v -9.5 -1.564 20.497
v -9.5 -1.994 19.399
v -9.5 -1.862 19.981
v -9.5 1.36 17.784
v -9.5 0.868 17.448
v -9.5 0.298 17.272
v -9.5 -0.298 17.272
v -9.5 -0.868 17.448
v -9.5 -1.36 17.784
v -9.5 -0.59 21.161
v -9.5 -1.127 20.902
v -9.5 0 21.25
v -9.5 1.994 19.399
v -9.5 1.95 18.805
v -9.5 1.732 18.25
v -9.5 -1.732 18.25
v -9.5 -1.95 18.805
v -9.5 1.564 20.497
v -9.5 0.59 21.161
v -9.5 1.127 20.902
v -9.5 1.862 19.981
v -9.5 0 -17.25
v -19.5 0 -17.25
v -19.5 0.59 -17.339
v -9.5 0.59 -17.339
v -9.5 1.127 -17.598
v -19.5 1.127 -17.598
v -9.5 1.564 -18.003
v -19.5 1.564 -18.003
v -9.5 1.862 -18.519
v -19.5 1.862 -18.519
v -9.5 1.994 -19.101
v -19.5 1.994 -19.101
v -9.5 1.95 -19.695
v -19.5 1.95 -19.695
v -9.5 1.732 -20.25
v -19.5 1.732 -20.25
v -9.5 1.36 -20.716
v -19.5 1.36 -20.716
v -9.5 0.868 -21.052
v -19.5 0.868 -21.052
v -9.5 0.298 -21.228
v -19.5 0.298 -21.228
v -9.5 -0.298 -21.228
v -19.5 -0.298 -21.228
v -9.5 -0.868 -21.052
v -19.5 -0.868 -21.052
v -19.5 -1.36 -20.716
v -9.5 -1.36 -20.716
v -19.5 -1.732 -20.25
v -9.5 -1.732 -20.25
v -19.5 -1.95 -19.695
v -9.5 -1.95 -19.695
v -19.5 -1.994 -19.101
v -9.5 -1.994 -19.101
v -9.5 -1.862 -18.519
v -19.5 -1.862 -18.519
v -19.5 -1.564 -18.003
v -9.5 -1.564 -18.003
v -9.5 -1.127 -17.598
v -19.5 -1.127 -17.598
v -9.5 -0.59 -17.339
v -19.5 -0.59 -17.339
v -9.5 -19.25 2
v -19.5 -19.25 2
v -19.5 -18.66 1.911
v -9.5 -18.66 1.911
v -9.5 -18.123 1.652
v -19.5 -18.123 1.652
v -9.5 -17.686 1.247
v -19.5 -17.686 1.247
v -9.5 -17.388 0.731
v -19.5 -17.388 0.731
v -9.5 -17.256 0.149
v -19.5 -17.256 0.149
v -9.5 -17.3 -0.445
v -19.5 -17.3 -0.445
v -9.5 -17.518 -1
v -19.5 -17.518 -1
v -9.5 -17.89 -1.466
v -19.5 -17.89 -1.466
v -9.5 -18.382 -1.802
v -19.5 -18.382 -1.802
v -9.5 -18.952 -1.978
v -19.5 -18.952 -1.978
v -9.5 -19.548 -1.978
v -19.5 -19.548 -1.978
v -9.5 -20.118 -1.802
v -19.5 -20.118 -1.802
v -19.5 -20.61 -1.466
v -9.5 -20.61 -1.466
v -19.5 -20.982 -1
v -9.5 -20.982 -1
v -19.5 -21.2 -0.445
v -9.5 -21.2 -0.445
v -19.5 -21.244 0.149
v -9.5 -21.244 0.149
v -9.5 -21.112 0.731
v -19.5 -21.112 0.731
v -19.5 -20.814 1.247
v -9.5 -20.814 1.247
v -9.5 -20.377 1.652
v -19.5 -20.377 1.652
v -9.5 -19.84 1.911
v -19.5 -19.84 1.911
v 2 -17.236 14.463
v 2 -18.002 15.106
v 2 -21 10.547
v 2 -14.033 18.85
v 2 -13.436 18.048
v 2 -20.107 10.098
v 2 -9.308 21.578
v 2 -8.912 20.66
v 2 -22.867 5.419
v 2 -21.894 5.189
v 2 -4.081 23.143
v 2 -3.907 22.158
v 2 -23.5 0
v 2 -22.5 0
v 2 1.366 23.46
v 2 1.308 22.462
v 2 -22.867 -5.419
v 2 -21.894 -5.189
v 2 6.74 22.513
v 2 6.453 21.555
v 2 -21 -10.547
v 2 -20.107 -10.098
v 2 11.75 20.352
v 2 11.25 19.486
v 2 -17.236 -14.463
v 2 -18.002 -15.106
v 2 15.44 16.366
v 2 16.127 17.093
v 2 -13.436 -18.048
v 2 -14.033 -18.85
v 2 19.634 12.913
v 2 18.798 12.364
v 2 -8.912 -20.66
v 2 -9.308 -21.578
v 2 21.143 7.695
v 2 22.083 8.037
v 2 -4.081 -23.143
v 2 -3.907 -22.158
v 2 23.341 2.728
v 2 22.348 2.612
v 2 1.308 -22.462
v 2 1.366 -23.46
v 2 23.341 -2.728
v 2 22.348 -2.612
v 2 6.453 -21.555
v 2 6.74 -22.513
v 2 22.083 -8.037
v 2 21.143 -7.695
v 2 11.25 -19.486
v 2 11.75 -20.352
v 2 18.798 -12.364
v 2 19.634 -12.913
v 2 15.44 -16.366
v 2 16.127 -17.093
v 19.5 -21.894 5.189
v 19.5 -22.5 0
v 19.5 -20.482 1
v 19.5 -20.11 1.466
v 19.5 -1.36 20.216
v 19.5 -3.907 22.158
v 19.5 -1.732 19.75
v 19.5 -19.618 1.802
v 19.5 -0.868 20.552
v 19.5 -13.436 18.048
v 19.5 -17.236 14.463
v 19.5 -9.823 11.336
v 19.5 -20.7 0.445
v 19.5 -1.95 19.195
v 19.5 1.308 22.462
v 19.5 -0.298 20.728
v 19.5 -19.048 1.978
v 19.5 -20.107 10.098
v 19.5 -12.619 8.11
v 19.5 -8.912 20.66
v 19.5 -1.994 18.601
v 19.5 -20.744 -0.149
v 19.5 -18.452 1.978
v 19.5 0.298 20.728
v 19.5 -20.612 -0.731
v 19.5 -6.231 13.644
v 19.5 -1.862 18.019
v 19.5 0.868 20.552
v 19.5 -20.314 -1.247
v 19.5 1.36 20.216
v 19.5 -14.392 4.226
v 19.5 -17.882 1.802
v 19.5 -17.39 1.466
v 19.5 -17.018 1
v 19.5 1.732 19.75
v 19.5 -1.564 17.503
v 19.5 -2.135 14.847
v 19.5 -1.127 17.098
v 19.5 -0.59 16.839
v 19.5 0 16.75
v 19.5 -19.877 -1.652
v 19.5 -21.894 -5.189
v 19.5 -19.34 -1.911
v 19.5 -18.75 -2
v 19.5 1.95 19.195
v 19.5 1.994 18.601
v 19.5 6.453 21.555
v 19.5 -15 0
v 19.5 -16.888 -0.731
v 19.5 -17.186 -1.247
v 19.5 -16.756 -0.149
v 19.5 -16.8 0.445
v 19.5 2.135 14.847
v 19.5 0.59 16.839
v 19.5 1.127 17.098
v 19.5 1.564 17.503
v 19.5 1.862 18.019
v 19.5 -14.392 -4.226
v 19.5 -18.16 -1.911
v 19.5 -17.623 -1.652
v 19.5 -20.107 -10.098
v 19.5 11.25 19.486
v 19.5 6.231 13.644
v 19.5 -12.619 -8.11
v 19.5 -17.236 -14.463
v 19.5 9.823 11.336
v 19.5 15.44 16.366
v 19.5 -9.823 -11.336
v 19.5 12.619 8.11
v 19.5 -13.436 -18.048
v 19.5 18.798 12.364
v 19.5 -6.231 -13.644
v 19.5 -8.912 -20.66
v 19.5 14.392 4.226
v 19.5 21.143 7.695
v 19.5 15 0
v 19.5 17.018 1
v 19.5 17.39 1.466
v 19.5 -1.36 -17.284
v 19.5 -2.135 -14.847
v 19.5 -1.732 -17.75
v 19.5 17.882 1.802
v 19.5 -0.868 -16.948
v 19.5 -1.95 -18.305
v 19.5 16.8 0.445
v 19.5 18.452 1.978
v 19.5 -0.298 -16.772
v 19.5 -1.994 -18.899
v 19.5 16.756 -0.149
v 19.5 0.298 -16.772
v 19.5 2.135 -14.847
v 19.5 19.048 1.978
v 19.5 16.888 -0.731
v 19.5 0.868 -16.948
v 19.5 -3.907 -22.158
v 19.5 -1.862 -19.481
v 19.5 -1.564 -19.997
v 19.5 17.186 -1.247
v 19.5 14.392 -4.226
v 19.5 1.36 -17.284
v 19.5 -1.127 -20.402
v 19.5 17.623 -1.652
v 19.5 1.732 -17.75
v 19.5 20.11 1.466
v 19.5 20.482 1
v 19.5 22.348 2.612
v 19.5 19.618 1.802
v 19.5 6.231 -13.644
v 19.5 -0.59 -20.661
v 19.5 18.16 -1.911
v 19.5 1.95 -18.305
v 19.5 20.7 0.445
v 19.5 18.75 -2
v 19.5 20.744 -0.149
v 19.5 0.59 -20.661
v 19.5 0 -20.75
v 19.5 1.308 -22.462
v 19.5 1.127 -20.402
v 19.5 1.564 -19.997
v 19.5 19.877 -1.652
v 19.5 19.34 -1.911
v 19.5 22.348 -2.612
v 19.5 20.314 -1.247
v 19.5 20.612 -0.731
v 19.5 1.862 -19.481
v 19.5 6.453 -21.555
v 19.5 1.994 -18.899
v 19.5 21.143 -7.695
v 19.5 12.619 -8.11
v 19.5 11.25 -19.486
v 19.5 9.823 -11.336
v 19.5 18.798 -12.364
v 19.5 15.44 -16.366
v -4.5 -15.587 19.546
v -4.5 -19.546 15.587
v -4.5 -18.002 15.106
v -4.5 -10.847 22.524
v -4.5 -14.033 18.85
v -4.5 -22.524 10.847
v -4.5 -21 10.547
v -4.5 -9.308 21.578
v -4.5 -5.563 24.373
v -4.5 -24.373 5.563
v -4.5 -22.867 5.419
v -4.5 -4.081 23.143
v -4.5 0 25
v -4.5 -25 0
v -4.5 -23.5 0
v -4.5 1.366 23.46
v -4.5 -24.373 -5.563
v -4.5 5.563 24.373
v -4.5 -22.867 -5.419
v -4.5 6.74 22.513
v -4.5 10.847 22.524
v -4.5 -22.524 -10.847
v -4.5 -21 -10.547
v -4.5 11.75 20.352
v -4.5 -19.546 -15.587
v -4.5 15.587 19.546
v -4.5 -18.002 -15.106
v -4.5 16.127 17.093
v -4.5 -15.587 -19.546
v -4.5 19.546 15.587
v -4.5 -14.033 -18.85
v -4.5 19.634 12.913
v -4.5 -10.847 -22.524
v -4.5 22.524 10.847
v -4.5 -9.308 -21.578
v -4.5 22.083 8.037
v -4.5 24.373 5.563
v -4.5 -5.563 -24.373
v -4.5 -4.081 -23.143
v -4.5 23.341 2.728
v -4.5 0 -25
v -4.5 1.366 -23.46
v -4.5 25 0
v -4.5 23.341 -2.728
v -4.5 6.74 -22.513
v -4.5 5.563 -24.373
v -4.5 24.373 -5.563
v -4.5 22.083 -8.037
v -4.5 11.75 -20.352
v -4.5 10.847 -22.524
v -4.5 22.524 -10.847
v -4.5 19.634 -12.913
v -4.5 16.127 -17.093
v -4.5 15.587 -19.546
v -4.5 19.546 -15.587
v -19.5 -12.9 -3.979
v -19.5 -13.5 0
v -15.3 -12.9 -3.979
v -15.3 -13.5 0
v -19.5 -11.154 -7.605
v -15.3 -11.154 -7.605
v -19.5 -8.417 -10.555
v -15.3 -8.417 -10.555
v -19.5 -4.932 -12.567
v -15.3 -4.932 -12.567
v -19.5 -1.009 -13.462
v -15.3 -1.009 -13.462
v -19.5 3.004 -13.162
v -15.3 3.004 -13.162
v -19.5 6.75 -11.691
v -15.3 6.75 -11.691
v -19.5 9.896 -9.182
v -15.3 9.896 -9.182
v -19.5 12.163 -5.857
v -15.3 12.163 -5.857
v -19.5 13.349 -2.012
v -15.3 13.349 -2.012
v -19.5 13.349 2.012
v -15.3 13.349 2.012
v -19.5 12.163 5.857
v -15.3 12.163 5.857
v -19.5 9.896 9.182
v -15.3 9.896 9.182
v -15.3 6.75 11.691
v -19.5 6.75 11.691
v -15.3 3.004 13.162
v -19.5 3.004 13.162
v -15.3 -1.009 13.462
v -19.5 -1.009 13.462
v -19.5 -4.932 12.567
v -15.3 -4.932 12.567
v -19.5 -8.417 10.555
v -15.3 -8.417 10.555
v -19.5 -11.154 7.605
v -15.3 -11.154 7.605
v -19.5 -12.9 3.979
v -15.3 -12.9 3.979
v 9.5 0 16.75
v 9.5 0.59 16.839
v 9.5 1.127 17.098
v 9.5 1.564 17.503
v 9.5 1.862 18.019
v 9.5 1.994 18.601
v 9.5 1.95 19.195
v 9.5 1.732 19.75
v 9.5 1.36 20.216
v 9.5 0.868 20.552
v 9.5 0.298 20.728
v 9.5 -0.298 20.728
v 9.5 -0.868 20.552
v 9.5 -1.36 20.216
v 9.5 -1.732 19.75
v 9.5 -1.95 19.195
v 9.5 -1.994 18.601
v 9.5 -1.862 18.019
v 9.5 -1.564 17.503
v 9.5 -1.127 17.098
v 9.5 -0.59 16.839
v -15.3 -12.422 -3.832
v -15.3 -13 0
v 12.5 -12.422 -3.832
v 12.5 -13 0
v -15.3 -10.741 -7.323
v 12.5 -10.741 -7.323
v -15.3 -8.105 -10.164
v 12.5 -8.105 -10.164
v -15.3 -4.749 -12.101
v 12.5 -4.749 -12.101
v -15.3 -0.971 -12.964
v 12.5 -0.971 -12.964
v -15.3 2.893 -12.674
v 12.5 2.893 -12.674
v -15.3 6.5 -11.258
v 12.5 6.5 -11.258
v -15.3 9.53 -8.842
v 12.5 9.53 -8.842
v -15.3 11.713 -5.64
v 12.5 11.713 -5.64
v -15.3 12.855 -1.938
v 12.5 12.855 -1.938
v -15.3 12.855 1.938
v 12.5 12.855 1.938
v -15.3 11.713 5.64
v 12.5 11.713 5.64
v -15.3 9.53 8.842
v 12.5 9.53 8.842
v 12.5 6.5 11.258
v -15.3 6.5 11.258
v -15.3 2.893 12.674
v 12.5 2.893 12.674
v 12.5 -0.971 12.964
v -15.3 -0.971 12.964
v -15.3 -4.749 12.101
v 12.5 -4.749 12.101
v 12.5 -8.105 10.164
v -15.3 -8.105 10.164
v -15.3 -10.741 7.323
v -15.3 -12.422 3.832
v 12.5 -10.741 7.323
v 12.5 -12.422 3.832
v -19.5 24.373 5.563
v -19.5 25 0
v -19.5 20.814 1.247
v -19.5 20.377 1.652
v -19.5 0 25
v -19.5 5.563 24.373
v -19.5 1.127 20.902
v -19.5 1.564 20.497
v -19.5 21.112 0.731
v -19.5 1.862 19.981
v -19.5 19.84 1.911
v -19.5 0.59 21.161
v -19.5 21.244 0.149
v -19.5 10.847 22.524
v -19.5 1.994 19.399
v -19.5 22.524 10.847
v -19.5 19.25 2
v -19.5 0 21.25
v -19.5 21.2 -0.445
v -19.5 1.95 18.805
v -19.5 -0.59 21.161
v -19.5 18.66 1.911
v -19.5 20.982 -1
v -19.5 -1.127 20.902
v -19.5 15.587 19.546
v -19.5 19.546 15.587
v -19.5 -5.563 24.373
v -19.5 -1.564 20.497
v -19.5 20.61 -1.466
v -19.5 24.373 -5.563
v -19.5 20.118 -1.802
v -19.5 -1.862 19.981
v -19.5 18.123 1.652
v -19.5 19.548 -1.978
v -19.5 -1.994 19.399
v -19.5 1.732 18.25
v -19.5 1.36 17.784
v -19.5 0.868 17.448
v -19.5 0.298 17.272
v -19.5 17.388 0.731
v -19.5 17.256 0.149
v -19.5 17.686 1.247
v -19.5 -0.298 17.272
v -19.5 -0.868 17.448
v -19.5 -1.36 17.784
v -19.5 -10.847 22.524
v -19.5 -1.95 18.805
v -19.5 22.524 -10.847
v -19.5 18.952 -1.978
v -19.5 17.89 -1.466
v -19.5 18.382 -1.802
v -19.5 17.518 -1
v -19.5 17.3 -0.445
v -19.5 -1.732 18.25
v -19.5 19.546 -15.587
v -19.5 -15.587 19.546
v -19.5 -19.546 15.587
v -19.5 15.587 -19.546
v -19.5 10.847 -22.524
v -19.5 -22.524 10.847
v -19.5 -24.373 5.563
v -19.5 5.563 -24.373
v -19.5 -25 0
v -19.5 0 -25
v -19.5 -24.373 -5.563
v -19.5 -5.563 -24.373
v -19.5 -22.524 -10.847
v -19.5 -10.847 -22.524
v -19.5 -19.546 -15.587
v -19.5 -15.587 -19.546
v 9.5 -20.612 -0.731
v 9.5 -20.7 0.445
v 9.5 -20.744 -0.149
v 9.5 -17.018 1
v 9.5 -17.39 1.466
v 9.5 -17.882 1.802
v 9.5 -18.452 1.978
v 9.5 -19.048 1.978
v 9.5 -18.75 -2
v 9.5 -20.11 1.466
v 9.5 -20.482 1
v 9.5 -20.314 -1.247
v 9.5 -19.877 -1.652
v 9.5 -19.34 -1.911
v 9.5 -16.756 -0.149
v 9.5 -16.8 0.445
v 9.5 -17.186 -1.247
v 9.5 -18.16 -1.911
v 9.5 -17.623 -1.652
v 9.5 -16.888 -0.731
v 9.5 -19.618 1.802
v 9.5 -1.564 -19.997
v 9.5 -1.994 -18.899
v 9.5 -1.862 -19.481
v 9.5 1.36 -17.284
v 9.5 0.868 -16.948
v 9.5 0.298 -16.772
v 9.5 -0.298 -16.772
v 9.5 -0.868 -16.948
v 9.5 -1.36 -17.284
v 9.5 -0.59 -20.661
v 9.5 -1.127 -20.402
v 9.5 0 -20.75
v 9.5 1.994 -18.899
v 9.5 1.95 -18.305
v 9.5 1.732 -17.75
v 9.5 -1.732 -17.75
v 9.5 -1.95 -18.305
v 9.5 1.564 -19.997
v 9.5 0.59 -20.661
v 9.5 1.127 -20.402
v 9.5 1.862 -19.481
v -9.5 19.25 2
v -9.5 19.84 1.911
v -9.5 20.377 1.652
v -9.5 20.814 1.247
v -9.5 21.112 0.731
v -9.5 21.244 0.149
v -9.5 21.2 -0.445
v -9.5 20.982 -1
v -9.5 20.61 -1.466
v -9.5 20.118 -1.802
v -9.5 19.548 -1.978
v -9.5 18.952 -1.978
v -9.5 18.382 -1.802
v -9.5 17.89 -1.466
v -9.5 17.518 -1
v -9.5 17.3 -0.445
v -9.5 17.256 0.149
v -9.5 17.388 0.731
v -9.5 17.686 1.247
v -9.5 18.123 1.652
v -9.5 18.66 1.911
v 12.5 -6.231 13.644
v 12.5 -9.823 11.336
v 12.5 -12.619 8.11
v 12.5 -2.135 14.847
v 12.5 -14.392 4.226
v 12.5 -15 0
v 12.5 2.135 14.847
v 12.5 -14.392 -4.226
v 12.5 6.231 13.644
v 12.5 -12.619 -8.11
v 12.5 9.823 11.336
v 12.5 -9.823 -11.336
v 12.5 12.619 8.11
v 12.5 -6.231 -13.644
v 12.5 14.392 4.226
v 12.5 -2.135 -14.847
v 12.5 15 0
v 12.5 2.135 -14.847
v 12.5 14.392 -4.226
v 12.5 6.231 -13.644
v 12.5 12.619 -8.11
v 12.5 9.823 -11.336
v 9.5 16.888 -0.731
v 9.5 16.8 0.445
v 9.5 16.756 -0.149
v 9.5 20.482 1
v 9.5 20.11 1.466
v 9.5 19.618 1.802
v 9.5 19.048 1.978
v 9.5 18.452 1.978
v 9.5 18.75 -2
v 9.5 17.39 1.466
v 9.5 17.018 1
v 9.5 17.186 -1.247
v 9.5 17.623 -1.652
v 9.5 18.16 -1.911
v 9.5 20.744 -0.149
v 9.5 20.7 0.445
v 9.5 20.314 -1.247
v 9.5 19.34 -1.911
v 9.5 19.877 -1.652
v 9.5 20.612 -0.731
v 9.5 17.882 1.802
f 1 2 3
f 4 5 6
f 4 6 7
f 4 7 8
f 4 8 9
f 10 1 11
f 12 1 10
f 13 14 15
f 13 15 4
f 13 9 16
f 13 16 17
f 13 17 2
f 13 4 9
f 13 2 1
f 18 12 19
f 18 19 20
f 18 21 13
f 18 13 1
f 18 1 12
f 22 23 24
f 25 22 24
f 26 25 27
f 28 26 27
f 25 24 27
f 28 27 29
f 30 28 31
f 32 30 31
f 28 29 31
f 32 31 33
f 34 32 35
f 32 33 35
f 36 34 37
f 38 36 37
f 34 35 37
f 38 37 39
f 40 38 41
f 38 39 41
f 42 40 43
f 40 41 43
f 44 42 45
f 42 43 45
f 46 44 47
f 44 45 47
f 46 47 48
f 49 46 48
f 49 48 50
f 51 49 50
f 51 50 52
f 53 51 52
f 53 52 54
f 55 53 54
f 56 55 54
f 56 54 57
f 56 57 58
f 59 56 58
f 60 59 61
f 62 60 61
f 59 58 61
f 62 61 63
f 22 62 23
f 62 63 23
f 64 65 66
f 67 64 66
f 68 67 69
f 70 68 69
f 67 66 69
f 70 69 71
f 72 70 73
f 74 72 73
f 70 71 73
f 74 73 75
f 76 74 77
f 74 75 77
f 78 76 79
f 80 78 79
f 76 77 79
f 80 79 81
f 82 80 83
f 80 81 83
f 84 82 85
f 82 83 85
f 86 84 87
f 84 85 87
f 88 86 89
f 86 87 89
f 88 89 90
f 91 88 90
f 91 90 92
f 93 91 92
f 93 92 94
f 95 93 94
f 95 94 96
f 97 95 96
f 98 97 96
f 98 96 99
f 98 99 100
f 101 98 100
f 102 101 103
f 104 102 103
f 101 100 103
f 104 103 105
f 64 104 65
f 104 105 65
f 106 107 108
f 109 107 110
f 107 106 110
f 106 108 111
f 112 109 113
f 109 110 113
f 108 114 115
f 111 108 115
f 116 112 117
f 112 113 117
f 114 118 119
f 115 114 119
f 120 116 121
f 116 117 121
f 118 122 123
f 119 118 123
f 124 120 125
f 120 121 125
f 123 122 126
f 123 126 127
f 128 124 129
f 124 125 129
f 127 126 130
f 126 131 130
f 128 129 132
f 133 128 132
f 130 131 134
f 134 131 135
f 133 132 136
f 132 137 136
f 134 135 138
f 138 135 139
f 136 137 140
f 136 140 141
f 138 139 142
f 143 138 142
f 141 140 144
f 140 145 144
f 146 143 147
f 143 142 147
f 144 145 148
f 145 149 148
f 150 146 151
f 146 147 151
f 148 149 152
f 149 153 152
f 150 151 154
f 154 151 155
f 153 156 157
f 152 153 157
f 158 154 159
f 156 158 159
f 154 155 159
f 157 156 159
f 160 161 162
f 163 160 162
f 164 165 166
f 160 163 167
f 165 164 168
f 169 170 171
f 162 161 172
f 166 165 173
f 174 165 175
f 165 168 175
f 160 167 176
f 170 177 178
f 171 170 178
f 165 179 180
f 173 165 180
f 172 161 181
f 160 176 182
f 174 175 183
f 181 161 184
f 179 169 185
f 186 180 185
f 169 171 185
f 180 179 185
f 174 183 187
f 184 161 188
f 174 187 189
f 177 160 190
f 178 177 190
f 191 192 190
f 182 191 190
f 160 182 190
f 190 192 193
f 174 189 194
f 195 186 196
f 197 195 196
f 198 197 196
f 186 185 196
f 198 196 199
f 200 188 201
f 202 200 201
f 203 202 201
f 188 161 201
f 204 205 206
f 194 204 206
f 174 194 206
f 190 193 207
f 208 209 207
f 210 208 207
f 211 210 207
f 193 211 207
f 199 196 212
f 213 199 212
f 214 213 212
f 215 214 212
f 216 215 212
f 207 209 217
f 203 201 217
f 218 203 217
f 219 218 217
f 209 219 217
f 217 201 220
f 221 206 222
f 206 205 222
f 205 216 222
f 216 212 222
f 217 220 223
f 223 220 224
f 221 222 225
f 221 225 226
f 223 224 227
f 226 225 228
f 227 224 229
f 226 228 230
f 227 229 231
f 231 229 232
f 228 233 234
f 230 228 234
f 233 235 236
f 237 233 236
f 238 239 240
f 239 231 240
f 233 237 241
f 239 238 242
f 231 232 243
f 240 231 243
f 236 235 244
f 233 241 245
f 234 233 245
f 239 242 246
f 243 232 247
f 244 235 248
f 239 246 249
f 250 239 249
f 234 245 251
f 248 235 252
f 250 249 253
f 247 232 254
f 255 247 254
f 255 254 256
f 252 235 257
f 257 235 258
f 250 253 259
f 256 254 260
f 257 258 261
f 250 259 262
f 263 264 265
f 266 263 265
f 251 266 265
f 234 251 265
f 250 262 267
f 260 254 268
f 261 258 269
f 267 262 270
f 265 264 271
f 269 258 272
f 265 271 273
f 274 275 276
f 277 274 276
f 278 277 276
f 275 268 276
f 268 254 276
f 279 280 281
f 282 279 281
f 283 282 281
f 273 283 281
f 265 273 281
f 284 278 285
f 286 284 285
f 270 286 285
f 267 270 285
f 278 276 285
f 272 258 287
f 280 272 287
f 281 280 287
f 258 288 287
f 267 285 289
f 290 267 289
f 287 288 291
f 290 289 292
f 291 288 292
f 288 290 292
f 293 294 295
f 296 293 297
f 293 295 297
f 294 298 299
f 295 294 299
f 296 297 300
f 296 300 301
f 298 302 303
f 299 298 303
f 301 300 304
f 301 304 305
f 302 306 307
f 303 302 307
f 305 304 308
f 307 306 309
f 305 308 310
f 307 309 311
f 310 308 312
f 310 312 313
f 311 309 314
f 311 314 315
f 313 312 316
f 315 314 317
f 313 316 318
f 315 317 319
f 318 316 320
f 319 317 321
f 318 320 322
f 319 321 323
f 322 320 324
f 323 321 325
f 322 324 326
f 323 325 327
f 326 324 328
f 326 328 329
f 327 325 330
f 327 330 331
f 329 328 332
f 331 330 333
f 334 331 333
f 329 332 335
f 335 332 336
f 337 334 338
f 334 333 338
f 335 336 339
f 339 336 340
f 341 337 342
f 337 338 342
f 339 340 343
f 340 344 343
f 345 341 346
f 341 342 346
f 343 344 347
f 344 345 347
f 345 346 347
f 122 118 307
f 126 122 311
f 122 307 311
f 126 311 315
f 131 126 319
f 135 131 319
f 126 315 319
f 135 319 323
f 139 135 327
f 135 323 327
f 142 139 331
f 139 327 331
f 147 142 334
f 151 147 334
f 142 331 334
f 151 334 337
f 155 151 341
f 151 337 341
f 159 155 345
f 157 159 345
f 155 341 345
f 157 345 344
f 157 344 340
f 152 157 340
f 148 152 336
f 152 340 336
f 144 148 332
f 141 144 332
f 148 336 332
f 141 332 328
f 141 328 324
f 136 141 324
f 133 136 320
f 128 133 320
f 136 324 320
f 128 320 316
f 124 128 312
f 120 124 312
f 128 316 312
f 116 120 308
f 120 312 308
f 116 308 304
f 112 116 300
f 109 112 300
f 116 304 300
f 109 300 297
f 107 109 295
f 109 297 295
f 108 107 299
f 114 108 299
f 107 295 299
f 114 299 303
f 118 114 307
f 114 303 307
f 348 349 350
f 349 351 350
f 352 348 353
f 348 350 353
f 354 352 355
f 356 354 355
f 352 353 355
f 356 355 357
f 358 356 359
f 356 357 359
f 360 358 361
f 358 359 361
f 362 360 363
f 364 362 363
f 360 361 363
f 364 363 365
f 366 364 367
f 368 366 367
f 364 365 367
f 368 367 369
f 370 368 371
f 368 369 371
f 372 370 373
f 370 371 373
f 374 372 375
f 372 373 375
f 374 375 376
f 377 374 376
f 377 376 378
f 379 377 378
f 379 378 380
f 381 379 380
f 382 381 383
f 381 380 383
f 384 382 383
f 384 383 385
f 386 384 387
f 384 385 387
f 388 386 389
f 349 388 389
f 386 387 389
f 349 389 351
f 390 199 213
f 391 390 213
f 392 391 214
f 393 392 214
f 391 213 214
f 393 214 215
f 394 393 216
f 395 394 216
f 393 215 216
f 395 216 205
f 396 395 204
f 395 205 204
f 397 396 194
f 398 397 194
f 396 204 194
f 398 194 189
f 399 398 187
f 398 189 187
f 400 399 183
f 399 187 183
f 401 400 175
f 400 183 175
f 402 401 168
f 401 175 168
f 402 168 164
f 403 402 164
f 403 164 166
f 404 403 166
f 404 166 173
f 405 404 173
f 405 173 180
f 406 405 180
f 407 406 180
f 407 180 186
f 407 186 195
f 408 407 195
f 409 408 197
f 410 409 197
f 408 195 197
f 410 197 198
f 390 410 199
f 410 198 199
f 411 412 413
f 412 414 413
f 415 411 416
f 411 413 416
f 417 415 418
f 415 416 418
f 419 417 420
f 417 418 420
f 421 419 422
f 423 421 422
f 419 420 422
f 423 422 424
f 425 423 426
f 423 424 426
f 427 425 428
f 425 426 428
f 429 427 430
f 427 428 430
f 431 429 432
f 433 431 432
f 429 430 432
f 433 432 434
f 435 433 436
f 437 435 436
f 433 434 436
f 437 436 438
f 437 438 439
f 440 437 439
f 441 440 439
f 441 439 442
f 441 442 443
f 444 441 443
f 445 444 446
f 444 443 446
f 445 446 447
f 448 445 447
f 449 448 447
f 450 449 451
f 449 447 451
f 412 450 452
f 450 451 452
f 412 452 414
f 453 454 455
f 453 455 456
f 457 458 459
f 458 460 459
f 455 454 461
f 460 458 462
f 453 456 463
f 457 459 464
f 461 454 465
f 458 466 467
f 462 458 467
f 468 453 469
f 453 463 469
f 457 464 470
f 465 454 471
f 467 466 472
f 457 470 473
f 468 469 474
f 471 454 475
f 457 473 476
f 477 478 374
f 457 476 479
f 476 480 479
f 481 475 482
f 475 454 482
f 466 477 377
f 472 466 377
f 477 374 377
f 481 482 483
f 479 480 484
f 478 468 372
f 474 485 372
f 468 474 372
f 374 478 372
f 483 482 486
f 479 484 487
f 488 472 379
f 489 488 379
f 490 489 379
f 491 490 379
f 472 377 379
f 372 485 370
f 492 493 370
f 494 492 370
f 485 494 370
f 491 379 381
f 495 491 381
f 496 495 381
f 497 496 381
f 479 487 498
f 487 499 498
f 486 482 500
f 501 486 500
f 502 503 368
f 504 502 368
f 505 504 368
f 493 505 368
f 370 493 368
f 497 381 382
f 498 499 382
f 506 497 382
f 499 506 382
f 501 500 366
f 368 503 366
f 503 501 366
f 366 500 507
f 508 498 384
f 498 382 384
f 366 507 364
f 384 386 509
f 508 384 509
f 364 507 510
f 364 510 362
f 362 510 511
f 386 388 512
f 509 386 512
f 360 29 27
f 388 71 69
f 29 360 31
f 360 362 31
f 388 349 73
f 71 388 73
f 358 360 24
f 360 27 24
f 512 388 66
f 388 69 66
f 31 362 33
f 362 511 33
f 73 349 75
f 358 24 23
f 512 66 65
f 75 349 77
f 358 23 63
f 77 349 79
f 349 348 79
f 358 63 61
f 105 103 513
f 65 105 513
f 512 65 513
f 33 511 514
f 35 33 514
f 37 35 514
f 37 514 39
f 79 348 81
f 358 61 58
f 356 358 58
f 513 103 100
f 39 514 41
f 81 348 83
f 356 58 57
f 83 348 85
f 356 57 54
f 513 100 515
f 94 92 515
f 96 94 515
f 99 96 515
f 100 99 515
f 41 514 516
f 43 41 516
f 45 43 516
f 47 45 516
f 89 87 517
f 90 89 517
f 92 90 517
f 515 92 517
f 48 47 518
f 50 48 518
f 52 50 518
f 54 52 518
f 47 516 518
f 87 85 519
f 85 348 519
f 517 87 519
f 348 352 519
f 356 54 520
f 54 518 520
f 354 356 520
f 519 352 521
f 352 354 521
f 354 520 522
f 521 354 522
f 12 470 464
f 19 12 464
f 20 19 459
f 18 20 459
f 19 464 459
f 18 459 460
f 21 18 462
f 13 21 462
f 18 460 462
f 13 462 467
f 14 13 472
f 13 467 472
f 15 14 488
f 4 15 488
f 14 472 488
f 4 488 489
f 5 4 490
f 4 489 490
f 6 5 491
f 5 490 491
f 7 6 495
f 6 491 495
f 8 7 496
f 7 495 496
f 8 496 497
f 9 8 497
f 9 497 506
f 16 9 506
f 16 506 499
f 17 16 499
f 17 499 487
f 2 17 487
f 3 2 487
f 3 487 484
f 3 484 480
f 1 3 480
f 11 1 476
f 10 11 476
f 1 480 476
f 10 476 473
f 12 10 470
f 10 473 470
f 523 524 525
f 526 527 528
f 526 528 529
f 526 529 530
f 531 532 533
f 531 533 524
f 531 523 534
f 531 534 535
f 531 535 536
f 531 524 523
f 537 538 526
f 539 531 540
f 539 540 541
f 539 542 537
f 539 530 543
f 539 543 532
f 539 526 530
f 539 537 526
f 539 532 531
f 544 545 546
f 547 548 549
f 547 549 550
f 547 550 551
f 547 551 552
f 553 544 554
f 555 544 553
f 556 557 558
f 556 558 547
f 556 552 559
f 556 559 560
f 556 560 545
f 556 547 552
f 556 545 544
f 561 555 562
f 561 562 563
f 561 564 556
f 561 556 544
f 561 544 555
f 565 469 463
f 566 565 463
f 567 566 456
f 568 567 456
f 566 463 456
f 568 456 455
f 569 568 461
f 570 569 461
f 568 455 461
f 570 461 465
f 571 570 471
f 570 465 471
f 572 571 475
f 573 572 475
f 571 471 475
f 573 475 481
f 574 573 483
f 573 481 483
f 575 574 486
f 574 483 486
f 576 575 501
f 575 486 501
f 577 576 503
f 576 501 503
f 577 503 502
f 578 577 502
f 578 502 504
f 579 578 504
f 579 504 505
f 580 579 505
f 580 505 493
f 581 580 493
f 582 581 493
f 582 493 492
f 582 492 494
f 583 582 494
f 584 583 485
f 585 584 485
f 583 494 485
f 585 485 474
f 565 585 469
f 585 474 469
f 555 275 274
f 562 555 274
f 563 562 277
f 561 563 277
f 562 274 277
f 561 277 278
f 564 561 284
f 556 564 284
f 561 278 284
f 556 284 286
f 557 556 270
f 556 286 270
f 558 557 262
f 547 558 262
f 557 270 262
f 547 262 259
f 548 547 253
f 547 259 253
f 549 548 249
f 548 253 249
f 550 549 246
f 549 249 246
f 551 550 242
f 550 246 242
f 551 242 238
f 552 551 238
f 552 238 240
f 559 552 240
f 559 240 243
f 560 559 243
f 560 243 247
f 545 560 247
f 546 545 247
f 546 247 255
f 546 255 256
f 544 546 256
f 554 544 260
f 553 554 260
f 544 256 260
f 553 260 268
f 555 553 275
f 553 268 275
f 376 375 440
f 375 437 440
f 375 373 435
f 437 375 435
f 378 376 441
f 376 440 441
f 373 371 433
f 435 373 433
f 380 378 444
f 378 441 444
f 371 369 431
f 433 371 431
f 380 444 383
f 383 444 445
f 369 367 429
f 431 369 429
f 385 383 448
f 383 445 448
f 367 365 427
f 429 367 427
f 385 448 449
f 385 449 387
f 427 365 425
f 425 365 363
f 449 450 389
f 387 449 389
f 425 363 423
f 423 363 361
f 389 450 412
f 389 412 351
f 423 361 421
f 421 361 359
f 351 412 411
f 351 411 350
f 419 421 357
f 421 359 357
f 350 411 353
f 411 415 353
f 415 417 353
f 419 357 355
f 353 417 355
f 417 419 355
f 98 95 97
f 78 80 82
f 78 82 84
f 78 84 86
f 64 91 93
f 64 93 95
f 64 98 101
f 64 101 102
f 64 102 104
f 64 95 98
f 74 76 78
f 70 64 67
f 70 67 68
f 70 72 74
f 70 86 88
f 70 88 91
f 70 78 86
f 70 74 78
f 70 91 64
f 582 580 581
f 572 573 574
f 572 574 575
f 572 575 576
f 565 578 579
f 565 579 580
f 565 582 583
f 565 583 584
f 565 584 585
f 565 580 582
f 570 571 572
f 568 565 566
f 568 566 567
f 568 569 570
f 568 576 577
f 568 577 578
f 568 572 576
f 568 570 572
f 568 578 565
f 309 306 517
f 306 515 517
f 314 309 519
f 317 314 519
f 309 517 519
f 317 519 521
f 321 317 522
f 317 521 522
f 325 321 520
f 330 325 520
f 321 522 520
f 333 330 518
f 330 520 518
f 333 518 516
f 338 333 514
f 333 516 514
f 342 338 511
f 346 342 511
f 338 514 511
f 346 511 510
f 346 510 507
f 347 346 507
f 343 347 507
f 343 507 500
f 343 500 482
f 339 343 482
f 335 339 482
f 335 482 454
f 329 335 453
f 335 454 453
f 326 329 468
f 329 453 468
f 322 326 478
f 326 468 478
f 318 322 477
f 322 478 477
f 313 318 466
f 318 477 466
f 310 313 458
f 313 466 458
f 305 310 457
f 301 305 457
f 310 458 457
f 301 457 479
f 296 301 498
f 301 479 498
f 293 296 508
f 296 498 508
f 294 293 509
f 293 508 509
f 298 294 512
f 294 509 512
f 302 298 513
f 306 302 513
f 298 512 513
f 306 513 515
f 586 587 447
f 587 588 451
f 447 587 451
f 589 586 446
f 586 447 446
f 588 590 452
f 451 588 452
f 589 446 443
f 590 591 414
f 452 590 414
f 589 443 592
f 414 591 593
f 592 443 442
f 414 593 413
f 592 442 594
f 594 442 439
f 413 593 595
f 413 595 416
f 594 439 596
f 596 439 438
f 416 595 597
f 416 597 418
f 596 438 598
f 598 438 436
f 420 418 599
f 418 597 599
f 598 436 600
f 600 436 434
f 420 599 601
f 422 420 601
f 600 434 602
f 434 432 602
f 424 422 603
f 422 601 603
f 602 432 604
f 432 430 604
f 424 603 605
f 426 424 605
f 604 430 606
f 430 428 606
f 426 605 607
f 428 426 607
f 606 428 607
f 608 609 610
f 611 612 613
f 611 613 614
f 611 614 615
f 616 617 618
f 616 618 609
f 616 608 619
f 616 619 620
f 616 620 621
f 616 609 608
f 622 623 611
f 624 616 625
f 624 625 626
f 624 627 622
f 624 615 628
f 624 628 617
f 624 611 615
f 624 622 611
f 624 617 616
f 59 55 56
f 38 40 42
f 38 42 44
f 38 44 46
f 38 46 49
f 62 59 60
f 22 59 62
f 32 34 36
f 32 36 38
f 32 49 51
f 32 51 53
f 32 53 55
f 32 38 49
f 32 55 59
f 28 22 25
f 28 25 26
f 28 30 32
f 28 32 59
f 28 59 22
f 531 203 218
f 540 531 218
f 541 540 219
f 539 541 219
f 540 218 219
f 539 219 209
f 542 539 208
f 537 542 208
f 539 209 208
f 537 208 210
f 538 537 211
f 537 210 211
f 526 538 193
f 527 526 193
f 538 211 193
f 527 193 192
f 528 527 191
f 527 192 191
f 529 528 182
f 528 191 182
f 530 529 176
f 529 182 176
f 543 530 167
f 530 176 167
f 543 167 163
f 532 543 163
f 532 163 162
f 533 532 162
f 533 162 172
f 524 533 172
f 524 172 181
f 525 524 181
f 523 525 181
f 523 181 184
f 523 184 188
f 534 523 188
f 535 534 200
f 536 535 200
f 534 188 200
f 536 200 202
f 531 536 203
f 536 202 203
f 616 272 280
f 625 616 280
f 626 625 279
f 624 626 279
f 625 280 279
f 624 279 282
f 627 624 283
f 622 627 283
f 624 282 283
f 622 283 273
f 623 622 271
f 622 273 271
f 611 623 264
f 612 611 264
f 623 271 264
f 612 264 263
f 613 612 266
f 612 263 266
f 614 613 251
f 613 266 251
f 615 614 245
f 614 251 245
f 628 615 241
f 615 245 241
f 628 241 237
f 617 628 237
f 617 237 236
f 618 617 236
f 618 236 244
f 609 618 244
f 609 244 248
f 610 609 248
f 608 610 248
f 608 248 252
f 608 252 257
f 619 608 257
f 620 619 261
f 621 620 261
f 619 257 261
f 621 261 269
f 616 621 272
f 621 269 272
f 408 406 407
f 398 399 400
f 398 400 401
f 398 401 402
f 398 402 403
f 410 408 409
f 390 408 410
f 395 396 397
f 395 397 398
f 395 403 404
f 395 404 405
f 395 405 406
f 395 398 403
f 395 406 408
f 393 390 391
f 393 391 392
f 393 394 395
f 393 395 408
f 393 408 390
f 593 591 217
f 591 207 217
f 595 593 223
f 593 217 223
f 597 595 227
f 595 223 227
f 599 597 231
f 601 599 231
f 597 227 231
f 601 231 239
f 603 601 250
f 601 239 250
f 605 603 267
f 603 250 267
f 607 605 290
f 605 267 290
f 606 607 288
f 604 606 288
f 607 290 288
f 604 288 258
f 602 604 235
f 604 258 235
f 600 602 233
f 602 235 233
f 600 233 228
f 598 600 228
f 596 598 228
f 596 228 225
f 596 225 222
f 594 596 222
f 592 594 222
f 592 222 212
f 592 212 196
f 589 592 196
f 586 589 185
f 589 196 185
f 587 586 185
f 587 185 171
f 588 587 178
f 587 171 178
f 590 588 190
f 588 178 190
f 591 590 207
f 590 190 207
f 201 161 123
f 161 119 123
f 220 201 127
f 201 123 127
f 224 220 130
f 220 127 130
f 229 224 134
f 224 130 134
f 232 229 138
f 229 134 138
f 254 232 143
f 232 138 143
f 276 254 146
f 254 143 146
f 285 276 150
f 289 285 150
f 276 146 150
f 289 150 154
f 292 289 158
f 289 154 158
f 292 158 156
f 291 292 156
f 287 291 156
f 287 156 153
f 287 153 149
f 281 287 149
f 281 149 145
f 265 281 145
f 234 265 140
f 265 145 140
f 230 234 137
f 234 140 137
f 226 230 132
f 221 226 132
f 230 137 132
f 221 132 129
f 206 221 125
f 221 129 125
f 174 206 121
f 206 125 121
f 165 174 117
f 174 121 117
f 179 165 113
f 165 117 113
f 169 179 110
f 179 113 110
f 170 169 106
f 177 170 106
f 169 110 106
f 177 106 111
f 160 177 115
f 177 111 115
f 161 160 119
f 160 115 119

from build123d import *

# Parameters (mm, degrees)
SKETCH2_R          = 2
CUT_EXTRUDE1_DEPTH = 10
SKETCH3_R          = 2
CUT_EXTRUDE2_DEPTH = 10


with BuildPart() as part:
    # Sketch1 → Revolve1 (revolve)
    with BuildSketch(Plane.XY, mode=Mode.PRIVATE) as revolve1_sk:
        Polygon((-19.5, 13.5), (-15.3, 13.5), (-15.3, 13), (12.5, 13), (12.5, 15), (19.5, 15), (19.5, 22.5), (2, 22.5), (2, 23.5), (-4.5, 23.5), (-4.5, 25), (-19.5, 25), align=None)
    revolve(revolve1_sk.sketch.rotate(Axis((-19.5, 0, 0), (1, 0, 0)), 180), axis=Axis((-19.5, 0, 0), (1, 0, 0)))

    # Sketch2 → Cut-Extrude1 (cut)
    with BuildSketch(Plane(origin=(19.5, 0, 0), x_dir=(0, 0, -1), z_dir=(1, 0, 0))):
        with Locations((0, 18.75)):
            Circle(SKETCH2_R)
        with Locations((18.75, 0)):
            Circle(SKETCH2_R)
        with Locations((0, -18.75)):
            Circle(SKETCH2_R)
        with Locations((-18.75, 0)):
            Circle(SKETCH2_R)
    extrude(amount=-CUT_EXTRUDE1_DEPTH, mode=Mode.SUBTRACT)

    # Sketch3 → Cut-Extrude2 (cut)
    with BuildSketch(Plane.ZY.offset(19.5)):
        with Locations((0, 19.25)):
            Circle(SKETCH3_R)
        with Locations((19.25, 0)):
            Circle(SKETCH3_R)
        with Locations((0, -19.25)):
            Circle(SKETCH3_R)
        with Locations((-19.25, 0)):
            Circle(SKETCH3_R)
    extrude(amount=-CUT_EXTRUDE2_DEPTH, mode=Mode.SUBTRACT)


solid = part.part
